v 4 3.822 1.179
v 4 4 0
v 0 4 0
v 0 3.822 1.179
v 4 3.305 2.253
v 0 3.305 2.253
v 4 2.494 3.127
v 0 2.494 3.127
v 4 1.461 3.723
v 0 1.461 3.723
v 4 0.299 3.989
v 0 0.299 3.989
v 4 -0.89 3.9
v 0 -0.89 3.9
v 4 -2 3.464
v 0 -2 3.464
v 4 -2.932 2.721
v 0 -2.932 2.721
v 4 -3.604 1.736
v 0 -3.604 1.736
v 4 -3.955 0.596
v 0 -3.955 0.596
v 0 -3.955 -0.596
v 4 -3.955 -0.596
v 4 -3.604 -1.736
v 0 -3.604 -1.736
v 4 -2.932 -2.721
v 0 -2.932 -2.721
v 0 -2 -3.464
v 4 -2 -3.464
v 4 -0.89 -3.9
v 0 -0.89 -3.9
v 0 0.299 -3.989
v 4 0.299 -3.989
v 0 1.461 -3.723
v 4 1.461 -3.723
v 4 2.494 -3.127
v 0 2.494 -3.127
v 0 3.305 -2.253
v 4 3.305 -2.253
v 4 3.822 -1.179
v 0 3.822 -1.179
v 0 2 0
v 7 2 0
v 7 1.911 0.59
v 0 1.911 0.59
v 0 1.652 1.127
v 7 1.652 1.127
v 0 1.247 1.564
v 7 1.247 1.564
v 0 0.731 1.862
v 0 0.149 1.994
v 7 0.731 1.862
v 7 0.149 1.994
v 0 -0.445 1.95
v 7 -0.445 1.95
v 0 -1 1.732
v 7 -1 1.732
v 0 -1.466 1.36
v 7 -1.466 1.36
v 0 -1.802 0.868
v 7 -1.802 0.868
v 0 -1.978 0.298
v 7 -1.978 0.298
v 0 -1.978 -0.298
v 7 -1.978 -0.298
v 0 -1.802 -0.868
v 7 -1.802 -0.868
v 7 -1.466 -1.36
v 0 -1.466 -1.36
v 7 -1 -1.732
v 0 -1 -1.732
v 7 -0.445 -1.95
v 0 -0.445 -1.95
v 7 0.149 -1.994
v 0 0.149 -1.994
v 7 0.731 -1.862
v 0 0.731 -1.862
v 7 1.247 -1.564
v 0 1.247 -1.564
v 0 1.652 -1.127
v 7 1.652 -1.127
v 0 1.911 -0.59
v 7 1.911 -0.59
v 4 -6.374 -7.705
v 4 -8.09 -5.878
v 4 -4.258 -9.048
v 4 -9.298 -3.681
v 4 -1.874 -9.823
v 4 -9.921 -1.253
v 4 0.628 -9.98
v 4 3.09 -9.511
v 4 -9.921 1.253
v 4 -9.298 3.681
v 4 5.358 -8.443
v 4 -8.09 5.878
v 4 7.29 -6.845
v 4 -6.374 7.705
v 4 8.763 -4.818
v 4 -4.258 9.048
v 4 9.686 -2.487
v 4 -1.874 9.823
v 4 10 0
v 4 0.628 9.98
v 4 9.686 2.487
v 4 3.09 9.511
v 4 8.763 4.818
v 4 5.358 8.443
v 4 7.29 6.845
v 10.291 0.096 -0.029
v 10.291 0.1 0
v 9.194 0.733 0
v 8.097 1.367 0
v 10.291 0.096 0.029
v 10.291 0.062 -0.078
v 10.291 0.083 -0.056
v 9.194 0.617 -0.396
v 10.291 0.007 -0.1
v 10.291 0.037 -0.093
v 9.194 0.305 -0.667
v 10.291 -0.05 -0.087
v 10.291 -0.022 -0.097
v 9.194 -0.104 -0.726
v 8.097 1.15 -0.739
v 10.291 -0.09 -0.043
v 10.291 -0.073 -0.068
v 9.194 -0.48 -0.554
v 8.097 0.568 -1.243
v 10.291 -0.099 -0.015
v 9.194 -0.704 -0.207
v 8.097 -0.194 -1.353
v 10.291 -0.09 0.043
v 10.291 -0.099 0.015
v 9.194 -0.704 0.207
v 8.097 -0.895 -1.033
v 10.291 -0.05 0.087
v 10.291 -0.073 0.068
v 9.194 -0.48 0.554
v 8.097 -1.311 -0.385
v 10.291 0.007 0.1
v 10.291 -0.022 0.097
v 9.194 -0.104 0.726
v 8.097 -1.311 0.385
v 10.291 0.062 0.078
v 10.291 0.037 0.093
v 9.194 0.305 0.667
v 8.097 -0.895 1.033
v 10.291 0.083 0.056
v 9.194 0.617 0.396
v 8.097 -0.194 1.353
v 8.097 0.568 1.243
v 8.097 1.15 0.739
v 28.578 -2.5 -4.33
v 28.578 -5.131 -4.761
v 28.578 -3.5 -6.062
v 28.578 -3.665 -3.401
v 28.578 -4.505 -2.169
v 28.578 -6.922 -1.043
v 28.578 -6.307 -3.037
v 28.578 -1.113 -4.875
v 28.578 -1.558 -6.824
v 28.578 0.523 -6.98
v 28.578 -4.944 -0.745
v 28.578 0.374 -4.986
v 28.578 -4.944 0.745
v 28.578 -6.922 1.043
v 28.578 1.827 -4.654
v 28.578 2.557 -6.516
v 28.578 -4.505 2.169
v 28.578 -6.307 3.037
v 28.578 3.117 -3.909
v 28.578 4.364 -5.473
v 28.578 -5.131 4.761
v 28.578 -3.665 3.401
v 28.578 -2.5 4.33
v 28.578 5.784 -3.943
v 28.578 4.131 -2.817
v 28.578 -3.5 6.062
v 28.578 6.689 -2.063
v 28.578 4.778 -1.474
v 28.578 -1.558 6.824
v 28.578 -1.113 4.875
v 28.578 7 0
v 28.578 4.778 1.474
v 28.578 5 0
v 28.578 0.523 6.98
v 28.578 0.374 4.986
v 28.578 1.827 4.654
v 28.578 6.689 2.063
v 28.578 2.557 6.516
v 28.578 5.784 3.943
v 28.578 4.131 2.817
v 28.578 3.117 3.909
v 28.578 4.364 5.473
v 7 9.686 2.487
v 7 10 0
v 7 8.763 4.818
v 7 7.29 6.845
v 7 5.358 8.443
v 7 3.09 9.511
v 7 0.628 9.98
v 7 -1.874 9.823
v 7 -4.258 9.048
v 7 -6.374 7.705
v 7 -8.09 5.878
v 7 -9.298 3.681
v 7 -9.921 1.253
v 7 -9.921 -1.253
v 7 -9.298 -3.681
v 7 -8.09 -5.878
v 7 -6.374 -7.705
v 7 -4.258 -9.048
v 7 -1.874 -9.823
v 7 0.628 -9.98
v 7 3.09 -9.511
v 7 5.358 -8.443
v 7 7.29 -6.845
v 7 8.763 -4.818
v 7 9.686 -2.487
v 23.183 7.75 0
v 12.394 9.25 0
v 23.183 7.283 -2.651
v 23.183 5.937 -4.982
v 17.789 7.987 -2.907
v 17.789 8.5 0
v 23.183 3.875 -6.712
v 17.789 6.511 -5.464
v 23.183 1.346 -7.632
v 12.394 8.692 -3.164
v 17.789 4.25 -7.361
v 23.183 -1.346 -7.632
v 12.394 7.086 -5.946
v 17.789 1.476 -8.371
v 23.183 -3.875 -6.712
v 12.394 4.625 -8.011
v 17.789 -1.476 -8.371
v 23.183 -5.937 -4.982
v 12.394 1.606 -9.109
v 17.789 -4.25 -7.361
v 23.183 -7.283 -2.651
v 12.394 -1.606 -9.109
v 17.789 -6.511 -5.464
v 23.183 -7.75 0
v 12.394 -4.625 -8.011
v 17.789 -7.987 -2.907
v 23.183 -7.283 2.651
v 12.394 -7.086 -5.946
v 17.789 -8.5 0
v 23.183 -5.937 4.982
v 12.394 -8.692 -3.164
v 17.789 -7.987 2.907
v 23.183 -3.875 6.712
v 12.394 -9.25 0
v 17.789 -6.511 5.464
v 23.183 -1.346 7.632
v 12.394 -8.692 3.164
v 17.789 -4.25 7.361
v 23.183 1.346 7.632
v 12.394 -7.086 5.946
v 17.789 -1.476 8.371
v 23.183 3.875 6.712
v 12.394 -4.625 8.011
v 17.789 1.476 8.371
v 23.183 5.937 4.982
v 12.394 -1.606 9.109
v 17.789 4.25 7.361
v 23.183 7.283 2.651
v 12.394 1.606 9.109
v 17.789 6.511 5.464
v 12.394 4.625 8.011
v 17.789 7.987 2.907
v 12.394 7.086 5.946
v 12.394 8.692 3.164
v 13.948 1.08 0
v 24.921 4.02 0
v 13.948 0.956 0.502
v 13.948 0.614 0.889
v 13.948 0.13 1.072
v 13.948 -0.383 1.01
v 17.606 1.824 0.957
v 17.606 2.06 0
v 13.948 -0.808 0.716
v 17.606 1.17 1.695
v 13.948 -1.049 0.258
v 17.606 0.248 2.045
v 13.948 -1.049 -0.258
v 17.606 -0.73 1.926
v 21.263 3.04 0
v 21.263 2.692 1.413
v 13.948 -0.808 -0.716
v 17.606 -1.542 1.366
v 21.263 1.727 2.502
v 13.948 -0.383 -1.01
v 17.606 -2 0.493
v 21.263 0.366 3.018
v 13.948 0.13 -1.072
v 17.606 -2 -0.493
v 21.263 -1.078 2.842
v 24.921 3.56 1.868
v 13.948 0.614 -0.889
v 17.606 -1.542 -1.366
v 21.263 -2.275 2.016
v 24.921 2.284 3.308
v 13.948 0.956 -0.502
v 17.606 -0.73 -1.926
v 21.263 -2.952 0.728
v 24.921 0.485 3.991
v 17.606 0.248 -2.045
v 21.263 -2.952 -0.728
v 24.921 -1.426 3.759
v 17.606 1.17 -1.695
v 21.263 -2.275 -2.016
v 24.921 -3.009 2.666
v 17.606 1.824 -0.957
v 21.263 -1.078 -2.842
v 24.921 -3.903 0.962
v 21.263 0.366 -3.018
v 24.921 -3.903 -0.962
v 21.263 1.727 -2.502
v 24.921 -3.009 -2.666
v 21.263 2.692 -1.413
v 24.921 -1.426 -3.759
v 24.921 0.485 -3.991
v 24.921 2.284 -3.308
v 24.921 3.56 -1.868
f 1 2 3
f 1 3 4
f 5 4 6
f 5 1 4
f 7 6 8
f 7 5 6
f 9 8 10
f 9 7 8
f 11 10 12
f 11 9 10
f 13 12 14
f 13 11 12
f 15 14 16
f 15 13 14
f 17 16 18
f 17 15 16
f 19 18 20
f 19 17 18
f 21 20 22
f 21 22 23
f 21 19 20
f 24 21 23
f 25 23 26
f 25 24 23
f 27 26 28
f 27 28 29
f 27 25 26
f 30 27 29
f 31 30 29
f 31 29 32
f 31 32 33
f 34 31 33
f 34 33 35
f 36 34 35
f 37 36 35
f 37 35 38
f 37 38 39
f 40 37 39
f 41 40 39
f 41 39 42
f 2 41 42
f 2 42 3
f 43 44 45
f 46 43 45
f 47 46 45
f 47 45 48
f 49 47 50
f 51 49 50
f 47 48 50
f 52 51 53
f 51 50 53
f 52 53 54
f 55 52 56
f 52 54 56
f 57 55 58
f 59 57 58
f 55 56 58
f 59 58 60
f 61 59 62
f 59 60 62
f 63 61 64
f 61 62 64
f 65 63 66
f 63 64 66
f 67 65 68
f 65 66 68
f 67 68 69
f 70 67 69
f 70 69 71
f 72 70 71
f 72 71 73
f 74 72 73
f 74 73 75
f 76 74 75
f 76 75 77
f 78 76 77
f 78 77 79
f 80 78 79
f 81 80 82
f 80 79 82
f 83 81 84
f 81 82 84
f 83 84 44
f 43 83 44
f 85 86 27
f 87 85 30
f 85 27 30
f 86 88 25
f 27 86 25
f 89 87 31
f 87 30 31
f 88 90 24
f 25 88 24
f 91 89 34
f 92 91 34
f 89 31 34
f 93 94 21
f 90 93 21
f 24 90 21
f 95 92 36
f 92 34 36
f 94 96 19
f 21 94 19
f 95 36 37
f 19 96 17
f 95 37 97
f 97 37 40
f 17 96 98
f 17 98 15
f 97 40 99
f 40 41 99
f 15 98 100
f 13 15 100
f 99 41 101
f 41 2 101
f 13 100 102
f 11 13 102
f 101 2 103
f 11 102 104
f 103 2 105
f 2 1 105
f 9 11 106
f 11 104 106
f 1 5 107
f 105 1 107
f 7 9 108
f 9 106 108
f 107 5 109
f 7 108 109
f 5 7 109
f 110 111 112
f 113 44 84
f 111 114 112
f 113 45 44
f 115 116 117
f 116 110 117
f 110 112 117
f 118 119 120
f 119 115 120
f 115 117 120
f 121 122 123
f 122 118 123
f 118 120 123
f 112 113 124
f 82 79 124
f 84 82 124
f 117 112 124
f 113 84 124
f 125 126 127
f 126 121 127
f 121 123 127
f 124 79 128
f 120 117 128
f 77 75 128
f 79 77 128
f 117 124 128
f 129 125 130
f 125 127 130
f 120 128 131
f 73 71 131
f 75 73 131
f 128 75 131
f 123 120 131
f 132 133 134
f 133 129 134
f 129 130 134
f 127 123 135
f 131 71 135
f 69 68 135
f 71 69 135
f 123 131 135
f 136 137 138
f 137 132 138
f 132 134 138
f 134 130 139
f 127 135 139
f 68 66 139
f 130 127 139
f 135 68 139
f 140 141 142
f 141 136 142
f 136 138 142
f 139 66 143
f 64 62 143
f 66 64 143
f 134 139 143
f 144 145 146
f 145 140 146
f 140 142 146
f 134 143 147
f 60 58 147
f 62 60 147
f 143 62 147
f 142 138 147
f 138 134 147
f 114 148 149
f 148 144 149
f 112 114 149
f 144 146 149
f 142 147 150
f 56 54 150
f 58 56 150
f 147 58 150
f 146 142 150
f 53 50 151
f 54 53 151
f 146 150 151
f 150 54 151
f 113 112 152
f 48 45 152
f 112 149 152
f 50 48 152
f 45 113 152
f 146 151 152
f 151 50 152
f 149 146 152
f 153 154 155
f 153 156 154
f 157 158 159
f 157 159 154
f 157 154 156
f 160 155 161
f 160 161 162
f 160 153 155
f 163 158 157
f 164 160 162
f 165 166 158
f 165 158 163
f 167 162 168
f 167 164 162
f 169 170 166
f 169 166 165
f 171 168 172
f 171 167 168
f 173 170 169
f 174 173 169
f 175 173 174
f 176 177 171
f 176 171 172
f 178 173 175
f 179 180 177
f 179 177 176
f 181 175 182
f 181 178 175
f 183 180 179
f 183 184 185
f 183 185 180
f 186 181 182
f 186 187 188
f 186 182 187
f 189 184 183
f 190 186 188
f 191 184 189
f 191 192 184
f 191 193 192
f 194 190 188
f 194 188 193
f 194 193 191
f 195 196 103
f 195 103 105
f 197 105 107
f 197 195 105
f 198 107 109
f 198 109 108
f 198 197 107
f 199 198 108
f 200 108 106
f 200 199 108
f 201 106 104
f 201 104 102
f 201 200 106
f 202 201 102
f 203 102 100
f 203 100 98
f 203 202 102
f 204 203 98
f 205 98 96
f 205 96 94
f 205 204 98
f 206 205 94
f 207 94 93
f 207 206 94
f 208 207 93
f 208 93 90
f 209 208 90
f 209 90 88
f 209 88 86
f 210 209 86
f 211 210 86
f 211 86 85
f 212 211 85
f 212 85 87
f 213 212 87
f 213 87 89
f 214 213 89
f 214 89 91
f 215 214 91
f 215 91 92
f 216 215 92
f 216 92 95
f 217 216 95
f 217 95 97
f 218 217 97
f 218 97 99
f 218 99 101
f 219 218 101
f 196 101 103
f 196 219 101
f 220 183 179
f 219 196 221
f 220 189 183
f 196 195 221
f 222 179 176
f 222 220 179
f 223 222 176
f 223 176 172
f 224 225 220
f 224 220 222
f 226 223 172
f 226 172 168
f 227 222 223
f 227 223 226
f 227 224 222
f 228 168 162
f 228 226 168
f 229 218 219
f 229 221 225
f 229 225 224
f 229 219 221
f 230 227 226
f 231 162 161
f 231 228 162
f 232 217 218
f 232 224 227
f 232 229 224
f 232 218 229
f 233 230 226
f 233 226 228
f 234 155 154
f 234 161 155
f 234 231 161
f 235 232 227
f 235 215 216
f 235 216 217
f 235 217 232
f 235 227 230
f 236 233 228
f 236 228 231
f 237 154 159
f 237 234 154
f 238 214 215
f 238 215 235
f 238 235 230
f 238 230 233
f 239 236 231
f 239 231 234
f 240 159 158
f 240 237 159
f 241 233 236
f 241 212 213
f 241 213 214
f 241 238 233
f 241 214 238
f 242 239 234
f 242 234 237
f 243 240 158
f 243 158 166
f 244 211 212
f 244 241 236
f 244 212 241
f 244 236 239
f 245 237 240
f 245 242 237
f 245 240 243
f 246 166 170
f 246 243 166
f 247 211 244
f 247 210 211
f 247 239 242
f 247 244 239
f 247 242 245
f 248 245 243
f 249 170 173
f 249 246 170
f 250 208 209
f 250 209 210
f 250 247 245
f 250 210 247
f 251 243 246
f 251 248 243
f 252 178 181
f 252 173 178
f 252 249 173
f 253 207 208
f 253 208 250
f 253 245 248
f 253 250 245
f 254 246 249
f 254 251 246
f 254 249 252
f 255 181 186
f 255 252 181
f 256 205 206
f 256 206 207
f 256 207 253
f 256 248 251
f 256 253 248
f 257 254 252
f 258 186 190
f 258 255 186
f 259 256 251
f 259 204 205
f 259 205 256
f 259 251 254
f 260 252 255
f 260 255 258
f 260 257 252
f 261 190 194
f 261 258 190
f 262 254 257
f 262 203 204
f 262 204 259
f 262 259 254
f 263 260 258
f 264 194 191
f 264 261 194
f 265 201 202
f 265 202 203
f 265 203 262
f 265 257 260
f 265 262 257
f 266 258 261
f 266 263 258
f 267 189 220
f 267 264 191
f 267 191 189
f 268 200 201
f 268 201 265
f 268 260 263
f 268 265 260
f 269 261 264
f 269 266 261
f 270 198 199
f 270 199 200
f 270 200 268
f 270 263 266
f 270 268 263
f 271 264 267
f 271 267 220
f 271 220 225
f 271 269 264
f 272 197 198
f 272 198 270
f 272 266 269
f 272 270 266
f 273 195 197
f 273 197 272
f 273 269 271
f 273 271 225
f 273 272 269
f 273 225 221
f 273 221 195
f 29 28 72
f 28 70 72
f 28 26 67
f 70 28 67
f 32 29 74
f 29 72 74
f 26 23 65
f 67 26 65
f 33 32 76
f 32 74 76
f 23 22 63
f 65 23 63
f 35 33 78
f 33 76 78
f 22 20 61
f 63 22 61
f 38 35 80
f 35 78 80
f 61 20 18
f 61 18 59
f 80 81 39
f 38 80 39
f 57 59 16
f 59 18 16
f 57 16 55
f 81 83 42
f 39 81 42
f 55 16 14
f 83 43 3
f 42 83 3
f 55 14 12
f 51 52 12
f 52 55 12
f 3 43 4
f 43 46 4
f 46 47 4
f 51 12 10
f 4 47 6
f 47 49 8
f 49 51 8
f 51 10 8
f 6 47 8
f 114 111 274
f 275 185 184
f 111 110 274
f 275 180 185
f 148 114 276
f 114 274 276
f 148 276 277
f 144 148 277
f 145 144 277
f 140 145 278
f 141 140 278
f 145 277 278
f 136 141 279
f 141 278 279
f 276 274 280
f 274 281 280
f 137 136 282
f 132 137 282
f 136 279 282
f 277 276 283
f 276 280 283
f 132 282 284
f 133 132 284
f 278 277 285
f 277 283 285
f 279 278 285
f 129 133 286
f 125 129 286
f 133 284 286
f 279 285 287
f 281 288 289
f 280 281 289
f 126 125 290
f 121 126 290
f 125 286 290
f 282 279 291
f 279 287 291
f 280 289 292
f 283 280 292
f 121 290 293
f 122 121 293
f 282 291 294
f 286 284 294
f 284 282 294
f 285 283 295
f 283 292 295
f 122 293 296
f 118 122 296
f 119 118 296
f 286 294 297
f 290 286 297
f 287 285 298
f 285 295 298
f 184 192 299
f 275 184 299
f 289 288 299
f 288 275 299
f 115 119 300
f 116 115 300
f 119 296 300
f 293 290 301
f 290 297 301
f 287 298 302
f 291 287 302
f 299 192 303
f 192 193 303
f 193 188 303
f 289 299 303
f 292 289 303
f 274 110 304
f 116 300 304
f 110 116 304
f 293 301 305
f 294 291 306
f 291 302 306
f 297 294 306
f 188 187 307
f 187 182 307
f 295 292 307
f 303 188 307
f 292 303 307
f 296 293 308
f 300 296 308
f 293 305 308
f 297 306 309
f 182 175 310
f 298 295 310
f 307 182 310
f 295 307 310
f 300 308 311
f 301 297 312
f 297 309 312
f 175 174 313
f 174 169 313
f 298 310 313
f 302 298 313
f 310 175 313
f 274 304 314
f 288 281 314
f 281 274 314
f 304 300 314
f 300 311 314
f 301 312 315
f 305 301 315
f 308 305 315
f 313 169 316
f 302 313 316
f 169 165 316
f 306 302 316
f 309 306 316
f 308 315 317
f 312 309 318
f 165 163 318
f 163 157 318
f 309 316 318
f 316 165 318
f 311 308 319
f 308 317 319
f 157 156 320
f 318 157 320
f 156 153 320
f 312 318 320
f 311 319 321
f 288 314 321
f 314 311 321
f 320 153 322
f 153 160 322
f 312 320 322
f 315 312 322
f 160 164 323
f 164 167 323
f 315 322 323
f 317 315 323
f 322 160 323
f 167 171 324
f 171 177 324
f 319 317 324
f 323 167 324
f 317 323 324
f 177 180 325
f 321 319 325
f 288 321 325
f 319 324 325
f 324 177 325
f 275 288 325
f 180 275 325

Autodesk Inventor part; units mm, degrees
ref_plane "YZ Plane" through (0, 0, 0) normal (1, 0, 0) x (0, 1, 0)
ref_plane "XZ Plane" through (0, 0, 0) normal (0, 1, 0) x (-1, 0, 0)
ref_plane "XY Plane" through (0, 0, 0) normal (0, 0, 1) x (1, 0, 0)
sketch "Sketch1" plane through (0, 0, 0) normal (0, 0, 1) x (1, 0, 0)
  line L0 (0, 0) -> (0, 2)
  line L1 (0, 2) -> (50, 2)
  line L2 (0, 0) -> (0, 0.1)
  line L3 (0, 0.1) -> (50, 0.1)
  line L4 (0, 0) -> (0, 5)
  line L5 (0, 5) -> (50, 5)
  line L6 (0, 0) -> (0, 4)
  line L7 (0, 4) -> (4, 4)
  line L8 (4, 4) -> (4, 2)
  line L9 (4, 2) -> (4, 10)
  line L10 (4, 2) -> (6.7109, 2) construction
  line L11 (4, 10) -> (7, 10)
  line L12 (7, 10) -> (7, 2)
  line L13 (7, 2) -> (10.2909, 0.1)
  line L14 (7, 2) -> (9.25, 2) construction
  line L15 (10.2909, 0.1) -> (28.5779, 5)
  line L16 (10.2909, 0.1) -> (29.223, 0.1) construction
  line L17 (28.5779, 5) -> (28.5779, 7)
  line L18 (28.5779, 7) -> (7, 10)
  line L19 (0, 0) -> (50, 0)
  line L20 (-10, 0) -> (60, 0) projected
  point P0 (0, 2)
  point P1 (7, 5)
  point P2 (4, 5)
  point P3 (17.0086, 2)
  point P4 (17.3818, 2)
  dimension "d0" = 2
  dimension "d1" = 50
  dimension "d2" = 0.1
  dimension "d3" = 5
  dimension "d4" = 4
  dimension "d5" = 4
  dimension "d6" = 8
  dimension "d8" = 3
  dimension "d9" = 30
  dimension "d10" = 15
  dimension "d13" = 50
revolve "Revolution2" add sketch "Sketch1" angle 360 about axis through (-10, 0, 0) along (1, 0, 0) contours L4 L7 L8 L1 | L13 L1 L15 | L8 L9 L5 L12 L1 | L12 L5 L15 L1 | L12 L18 L17 L5 | L5 L9 L11 L12
thread "Thread3" size "M8x1.25" class "6g" standard "ISO Metric profile" full length
